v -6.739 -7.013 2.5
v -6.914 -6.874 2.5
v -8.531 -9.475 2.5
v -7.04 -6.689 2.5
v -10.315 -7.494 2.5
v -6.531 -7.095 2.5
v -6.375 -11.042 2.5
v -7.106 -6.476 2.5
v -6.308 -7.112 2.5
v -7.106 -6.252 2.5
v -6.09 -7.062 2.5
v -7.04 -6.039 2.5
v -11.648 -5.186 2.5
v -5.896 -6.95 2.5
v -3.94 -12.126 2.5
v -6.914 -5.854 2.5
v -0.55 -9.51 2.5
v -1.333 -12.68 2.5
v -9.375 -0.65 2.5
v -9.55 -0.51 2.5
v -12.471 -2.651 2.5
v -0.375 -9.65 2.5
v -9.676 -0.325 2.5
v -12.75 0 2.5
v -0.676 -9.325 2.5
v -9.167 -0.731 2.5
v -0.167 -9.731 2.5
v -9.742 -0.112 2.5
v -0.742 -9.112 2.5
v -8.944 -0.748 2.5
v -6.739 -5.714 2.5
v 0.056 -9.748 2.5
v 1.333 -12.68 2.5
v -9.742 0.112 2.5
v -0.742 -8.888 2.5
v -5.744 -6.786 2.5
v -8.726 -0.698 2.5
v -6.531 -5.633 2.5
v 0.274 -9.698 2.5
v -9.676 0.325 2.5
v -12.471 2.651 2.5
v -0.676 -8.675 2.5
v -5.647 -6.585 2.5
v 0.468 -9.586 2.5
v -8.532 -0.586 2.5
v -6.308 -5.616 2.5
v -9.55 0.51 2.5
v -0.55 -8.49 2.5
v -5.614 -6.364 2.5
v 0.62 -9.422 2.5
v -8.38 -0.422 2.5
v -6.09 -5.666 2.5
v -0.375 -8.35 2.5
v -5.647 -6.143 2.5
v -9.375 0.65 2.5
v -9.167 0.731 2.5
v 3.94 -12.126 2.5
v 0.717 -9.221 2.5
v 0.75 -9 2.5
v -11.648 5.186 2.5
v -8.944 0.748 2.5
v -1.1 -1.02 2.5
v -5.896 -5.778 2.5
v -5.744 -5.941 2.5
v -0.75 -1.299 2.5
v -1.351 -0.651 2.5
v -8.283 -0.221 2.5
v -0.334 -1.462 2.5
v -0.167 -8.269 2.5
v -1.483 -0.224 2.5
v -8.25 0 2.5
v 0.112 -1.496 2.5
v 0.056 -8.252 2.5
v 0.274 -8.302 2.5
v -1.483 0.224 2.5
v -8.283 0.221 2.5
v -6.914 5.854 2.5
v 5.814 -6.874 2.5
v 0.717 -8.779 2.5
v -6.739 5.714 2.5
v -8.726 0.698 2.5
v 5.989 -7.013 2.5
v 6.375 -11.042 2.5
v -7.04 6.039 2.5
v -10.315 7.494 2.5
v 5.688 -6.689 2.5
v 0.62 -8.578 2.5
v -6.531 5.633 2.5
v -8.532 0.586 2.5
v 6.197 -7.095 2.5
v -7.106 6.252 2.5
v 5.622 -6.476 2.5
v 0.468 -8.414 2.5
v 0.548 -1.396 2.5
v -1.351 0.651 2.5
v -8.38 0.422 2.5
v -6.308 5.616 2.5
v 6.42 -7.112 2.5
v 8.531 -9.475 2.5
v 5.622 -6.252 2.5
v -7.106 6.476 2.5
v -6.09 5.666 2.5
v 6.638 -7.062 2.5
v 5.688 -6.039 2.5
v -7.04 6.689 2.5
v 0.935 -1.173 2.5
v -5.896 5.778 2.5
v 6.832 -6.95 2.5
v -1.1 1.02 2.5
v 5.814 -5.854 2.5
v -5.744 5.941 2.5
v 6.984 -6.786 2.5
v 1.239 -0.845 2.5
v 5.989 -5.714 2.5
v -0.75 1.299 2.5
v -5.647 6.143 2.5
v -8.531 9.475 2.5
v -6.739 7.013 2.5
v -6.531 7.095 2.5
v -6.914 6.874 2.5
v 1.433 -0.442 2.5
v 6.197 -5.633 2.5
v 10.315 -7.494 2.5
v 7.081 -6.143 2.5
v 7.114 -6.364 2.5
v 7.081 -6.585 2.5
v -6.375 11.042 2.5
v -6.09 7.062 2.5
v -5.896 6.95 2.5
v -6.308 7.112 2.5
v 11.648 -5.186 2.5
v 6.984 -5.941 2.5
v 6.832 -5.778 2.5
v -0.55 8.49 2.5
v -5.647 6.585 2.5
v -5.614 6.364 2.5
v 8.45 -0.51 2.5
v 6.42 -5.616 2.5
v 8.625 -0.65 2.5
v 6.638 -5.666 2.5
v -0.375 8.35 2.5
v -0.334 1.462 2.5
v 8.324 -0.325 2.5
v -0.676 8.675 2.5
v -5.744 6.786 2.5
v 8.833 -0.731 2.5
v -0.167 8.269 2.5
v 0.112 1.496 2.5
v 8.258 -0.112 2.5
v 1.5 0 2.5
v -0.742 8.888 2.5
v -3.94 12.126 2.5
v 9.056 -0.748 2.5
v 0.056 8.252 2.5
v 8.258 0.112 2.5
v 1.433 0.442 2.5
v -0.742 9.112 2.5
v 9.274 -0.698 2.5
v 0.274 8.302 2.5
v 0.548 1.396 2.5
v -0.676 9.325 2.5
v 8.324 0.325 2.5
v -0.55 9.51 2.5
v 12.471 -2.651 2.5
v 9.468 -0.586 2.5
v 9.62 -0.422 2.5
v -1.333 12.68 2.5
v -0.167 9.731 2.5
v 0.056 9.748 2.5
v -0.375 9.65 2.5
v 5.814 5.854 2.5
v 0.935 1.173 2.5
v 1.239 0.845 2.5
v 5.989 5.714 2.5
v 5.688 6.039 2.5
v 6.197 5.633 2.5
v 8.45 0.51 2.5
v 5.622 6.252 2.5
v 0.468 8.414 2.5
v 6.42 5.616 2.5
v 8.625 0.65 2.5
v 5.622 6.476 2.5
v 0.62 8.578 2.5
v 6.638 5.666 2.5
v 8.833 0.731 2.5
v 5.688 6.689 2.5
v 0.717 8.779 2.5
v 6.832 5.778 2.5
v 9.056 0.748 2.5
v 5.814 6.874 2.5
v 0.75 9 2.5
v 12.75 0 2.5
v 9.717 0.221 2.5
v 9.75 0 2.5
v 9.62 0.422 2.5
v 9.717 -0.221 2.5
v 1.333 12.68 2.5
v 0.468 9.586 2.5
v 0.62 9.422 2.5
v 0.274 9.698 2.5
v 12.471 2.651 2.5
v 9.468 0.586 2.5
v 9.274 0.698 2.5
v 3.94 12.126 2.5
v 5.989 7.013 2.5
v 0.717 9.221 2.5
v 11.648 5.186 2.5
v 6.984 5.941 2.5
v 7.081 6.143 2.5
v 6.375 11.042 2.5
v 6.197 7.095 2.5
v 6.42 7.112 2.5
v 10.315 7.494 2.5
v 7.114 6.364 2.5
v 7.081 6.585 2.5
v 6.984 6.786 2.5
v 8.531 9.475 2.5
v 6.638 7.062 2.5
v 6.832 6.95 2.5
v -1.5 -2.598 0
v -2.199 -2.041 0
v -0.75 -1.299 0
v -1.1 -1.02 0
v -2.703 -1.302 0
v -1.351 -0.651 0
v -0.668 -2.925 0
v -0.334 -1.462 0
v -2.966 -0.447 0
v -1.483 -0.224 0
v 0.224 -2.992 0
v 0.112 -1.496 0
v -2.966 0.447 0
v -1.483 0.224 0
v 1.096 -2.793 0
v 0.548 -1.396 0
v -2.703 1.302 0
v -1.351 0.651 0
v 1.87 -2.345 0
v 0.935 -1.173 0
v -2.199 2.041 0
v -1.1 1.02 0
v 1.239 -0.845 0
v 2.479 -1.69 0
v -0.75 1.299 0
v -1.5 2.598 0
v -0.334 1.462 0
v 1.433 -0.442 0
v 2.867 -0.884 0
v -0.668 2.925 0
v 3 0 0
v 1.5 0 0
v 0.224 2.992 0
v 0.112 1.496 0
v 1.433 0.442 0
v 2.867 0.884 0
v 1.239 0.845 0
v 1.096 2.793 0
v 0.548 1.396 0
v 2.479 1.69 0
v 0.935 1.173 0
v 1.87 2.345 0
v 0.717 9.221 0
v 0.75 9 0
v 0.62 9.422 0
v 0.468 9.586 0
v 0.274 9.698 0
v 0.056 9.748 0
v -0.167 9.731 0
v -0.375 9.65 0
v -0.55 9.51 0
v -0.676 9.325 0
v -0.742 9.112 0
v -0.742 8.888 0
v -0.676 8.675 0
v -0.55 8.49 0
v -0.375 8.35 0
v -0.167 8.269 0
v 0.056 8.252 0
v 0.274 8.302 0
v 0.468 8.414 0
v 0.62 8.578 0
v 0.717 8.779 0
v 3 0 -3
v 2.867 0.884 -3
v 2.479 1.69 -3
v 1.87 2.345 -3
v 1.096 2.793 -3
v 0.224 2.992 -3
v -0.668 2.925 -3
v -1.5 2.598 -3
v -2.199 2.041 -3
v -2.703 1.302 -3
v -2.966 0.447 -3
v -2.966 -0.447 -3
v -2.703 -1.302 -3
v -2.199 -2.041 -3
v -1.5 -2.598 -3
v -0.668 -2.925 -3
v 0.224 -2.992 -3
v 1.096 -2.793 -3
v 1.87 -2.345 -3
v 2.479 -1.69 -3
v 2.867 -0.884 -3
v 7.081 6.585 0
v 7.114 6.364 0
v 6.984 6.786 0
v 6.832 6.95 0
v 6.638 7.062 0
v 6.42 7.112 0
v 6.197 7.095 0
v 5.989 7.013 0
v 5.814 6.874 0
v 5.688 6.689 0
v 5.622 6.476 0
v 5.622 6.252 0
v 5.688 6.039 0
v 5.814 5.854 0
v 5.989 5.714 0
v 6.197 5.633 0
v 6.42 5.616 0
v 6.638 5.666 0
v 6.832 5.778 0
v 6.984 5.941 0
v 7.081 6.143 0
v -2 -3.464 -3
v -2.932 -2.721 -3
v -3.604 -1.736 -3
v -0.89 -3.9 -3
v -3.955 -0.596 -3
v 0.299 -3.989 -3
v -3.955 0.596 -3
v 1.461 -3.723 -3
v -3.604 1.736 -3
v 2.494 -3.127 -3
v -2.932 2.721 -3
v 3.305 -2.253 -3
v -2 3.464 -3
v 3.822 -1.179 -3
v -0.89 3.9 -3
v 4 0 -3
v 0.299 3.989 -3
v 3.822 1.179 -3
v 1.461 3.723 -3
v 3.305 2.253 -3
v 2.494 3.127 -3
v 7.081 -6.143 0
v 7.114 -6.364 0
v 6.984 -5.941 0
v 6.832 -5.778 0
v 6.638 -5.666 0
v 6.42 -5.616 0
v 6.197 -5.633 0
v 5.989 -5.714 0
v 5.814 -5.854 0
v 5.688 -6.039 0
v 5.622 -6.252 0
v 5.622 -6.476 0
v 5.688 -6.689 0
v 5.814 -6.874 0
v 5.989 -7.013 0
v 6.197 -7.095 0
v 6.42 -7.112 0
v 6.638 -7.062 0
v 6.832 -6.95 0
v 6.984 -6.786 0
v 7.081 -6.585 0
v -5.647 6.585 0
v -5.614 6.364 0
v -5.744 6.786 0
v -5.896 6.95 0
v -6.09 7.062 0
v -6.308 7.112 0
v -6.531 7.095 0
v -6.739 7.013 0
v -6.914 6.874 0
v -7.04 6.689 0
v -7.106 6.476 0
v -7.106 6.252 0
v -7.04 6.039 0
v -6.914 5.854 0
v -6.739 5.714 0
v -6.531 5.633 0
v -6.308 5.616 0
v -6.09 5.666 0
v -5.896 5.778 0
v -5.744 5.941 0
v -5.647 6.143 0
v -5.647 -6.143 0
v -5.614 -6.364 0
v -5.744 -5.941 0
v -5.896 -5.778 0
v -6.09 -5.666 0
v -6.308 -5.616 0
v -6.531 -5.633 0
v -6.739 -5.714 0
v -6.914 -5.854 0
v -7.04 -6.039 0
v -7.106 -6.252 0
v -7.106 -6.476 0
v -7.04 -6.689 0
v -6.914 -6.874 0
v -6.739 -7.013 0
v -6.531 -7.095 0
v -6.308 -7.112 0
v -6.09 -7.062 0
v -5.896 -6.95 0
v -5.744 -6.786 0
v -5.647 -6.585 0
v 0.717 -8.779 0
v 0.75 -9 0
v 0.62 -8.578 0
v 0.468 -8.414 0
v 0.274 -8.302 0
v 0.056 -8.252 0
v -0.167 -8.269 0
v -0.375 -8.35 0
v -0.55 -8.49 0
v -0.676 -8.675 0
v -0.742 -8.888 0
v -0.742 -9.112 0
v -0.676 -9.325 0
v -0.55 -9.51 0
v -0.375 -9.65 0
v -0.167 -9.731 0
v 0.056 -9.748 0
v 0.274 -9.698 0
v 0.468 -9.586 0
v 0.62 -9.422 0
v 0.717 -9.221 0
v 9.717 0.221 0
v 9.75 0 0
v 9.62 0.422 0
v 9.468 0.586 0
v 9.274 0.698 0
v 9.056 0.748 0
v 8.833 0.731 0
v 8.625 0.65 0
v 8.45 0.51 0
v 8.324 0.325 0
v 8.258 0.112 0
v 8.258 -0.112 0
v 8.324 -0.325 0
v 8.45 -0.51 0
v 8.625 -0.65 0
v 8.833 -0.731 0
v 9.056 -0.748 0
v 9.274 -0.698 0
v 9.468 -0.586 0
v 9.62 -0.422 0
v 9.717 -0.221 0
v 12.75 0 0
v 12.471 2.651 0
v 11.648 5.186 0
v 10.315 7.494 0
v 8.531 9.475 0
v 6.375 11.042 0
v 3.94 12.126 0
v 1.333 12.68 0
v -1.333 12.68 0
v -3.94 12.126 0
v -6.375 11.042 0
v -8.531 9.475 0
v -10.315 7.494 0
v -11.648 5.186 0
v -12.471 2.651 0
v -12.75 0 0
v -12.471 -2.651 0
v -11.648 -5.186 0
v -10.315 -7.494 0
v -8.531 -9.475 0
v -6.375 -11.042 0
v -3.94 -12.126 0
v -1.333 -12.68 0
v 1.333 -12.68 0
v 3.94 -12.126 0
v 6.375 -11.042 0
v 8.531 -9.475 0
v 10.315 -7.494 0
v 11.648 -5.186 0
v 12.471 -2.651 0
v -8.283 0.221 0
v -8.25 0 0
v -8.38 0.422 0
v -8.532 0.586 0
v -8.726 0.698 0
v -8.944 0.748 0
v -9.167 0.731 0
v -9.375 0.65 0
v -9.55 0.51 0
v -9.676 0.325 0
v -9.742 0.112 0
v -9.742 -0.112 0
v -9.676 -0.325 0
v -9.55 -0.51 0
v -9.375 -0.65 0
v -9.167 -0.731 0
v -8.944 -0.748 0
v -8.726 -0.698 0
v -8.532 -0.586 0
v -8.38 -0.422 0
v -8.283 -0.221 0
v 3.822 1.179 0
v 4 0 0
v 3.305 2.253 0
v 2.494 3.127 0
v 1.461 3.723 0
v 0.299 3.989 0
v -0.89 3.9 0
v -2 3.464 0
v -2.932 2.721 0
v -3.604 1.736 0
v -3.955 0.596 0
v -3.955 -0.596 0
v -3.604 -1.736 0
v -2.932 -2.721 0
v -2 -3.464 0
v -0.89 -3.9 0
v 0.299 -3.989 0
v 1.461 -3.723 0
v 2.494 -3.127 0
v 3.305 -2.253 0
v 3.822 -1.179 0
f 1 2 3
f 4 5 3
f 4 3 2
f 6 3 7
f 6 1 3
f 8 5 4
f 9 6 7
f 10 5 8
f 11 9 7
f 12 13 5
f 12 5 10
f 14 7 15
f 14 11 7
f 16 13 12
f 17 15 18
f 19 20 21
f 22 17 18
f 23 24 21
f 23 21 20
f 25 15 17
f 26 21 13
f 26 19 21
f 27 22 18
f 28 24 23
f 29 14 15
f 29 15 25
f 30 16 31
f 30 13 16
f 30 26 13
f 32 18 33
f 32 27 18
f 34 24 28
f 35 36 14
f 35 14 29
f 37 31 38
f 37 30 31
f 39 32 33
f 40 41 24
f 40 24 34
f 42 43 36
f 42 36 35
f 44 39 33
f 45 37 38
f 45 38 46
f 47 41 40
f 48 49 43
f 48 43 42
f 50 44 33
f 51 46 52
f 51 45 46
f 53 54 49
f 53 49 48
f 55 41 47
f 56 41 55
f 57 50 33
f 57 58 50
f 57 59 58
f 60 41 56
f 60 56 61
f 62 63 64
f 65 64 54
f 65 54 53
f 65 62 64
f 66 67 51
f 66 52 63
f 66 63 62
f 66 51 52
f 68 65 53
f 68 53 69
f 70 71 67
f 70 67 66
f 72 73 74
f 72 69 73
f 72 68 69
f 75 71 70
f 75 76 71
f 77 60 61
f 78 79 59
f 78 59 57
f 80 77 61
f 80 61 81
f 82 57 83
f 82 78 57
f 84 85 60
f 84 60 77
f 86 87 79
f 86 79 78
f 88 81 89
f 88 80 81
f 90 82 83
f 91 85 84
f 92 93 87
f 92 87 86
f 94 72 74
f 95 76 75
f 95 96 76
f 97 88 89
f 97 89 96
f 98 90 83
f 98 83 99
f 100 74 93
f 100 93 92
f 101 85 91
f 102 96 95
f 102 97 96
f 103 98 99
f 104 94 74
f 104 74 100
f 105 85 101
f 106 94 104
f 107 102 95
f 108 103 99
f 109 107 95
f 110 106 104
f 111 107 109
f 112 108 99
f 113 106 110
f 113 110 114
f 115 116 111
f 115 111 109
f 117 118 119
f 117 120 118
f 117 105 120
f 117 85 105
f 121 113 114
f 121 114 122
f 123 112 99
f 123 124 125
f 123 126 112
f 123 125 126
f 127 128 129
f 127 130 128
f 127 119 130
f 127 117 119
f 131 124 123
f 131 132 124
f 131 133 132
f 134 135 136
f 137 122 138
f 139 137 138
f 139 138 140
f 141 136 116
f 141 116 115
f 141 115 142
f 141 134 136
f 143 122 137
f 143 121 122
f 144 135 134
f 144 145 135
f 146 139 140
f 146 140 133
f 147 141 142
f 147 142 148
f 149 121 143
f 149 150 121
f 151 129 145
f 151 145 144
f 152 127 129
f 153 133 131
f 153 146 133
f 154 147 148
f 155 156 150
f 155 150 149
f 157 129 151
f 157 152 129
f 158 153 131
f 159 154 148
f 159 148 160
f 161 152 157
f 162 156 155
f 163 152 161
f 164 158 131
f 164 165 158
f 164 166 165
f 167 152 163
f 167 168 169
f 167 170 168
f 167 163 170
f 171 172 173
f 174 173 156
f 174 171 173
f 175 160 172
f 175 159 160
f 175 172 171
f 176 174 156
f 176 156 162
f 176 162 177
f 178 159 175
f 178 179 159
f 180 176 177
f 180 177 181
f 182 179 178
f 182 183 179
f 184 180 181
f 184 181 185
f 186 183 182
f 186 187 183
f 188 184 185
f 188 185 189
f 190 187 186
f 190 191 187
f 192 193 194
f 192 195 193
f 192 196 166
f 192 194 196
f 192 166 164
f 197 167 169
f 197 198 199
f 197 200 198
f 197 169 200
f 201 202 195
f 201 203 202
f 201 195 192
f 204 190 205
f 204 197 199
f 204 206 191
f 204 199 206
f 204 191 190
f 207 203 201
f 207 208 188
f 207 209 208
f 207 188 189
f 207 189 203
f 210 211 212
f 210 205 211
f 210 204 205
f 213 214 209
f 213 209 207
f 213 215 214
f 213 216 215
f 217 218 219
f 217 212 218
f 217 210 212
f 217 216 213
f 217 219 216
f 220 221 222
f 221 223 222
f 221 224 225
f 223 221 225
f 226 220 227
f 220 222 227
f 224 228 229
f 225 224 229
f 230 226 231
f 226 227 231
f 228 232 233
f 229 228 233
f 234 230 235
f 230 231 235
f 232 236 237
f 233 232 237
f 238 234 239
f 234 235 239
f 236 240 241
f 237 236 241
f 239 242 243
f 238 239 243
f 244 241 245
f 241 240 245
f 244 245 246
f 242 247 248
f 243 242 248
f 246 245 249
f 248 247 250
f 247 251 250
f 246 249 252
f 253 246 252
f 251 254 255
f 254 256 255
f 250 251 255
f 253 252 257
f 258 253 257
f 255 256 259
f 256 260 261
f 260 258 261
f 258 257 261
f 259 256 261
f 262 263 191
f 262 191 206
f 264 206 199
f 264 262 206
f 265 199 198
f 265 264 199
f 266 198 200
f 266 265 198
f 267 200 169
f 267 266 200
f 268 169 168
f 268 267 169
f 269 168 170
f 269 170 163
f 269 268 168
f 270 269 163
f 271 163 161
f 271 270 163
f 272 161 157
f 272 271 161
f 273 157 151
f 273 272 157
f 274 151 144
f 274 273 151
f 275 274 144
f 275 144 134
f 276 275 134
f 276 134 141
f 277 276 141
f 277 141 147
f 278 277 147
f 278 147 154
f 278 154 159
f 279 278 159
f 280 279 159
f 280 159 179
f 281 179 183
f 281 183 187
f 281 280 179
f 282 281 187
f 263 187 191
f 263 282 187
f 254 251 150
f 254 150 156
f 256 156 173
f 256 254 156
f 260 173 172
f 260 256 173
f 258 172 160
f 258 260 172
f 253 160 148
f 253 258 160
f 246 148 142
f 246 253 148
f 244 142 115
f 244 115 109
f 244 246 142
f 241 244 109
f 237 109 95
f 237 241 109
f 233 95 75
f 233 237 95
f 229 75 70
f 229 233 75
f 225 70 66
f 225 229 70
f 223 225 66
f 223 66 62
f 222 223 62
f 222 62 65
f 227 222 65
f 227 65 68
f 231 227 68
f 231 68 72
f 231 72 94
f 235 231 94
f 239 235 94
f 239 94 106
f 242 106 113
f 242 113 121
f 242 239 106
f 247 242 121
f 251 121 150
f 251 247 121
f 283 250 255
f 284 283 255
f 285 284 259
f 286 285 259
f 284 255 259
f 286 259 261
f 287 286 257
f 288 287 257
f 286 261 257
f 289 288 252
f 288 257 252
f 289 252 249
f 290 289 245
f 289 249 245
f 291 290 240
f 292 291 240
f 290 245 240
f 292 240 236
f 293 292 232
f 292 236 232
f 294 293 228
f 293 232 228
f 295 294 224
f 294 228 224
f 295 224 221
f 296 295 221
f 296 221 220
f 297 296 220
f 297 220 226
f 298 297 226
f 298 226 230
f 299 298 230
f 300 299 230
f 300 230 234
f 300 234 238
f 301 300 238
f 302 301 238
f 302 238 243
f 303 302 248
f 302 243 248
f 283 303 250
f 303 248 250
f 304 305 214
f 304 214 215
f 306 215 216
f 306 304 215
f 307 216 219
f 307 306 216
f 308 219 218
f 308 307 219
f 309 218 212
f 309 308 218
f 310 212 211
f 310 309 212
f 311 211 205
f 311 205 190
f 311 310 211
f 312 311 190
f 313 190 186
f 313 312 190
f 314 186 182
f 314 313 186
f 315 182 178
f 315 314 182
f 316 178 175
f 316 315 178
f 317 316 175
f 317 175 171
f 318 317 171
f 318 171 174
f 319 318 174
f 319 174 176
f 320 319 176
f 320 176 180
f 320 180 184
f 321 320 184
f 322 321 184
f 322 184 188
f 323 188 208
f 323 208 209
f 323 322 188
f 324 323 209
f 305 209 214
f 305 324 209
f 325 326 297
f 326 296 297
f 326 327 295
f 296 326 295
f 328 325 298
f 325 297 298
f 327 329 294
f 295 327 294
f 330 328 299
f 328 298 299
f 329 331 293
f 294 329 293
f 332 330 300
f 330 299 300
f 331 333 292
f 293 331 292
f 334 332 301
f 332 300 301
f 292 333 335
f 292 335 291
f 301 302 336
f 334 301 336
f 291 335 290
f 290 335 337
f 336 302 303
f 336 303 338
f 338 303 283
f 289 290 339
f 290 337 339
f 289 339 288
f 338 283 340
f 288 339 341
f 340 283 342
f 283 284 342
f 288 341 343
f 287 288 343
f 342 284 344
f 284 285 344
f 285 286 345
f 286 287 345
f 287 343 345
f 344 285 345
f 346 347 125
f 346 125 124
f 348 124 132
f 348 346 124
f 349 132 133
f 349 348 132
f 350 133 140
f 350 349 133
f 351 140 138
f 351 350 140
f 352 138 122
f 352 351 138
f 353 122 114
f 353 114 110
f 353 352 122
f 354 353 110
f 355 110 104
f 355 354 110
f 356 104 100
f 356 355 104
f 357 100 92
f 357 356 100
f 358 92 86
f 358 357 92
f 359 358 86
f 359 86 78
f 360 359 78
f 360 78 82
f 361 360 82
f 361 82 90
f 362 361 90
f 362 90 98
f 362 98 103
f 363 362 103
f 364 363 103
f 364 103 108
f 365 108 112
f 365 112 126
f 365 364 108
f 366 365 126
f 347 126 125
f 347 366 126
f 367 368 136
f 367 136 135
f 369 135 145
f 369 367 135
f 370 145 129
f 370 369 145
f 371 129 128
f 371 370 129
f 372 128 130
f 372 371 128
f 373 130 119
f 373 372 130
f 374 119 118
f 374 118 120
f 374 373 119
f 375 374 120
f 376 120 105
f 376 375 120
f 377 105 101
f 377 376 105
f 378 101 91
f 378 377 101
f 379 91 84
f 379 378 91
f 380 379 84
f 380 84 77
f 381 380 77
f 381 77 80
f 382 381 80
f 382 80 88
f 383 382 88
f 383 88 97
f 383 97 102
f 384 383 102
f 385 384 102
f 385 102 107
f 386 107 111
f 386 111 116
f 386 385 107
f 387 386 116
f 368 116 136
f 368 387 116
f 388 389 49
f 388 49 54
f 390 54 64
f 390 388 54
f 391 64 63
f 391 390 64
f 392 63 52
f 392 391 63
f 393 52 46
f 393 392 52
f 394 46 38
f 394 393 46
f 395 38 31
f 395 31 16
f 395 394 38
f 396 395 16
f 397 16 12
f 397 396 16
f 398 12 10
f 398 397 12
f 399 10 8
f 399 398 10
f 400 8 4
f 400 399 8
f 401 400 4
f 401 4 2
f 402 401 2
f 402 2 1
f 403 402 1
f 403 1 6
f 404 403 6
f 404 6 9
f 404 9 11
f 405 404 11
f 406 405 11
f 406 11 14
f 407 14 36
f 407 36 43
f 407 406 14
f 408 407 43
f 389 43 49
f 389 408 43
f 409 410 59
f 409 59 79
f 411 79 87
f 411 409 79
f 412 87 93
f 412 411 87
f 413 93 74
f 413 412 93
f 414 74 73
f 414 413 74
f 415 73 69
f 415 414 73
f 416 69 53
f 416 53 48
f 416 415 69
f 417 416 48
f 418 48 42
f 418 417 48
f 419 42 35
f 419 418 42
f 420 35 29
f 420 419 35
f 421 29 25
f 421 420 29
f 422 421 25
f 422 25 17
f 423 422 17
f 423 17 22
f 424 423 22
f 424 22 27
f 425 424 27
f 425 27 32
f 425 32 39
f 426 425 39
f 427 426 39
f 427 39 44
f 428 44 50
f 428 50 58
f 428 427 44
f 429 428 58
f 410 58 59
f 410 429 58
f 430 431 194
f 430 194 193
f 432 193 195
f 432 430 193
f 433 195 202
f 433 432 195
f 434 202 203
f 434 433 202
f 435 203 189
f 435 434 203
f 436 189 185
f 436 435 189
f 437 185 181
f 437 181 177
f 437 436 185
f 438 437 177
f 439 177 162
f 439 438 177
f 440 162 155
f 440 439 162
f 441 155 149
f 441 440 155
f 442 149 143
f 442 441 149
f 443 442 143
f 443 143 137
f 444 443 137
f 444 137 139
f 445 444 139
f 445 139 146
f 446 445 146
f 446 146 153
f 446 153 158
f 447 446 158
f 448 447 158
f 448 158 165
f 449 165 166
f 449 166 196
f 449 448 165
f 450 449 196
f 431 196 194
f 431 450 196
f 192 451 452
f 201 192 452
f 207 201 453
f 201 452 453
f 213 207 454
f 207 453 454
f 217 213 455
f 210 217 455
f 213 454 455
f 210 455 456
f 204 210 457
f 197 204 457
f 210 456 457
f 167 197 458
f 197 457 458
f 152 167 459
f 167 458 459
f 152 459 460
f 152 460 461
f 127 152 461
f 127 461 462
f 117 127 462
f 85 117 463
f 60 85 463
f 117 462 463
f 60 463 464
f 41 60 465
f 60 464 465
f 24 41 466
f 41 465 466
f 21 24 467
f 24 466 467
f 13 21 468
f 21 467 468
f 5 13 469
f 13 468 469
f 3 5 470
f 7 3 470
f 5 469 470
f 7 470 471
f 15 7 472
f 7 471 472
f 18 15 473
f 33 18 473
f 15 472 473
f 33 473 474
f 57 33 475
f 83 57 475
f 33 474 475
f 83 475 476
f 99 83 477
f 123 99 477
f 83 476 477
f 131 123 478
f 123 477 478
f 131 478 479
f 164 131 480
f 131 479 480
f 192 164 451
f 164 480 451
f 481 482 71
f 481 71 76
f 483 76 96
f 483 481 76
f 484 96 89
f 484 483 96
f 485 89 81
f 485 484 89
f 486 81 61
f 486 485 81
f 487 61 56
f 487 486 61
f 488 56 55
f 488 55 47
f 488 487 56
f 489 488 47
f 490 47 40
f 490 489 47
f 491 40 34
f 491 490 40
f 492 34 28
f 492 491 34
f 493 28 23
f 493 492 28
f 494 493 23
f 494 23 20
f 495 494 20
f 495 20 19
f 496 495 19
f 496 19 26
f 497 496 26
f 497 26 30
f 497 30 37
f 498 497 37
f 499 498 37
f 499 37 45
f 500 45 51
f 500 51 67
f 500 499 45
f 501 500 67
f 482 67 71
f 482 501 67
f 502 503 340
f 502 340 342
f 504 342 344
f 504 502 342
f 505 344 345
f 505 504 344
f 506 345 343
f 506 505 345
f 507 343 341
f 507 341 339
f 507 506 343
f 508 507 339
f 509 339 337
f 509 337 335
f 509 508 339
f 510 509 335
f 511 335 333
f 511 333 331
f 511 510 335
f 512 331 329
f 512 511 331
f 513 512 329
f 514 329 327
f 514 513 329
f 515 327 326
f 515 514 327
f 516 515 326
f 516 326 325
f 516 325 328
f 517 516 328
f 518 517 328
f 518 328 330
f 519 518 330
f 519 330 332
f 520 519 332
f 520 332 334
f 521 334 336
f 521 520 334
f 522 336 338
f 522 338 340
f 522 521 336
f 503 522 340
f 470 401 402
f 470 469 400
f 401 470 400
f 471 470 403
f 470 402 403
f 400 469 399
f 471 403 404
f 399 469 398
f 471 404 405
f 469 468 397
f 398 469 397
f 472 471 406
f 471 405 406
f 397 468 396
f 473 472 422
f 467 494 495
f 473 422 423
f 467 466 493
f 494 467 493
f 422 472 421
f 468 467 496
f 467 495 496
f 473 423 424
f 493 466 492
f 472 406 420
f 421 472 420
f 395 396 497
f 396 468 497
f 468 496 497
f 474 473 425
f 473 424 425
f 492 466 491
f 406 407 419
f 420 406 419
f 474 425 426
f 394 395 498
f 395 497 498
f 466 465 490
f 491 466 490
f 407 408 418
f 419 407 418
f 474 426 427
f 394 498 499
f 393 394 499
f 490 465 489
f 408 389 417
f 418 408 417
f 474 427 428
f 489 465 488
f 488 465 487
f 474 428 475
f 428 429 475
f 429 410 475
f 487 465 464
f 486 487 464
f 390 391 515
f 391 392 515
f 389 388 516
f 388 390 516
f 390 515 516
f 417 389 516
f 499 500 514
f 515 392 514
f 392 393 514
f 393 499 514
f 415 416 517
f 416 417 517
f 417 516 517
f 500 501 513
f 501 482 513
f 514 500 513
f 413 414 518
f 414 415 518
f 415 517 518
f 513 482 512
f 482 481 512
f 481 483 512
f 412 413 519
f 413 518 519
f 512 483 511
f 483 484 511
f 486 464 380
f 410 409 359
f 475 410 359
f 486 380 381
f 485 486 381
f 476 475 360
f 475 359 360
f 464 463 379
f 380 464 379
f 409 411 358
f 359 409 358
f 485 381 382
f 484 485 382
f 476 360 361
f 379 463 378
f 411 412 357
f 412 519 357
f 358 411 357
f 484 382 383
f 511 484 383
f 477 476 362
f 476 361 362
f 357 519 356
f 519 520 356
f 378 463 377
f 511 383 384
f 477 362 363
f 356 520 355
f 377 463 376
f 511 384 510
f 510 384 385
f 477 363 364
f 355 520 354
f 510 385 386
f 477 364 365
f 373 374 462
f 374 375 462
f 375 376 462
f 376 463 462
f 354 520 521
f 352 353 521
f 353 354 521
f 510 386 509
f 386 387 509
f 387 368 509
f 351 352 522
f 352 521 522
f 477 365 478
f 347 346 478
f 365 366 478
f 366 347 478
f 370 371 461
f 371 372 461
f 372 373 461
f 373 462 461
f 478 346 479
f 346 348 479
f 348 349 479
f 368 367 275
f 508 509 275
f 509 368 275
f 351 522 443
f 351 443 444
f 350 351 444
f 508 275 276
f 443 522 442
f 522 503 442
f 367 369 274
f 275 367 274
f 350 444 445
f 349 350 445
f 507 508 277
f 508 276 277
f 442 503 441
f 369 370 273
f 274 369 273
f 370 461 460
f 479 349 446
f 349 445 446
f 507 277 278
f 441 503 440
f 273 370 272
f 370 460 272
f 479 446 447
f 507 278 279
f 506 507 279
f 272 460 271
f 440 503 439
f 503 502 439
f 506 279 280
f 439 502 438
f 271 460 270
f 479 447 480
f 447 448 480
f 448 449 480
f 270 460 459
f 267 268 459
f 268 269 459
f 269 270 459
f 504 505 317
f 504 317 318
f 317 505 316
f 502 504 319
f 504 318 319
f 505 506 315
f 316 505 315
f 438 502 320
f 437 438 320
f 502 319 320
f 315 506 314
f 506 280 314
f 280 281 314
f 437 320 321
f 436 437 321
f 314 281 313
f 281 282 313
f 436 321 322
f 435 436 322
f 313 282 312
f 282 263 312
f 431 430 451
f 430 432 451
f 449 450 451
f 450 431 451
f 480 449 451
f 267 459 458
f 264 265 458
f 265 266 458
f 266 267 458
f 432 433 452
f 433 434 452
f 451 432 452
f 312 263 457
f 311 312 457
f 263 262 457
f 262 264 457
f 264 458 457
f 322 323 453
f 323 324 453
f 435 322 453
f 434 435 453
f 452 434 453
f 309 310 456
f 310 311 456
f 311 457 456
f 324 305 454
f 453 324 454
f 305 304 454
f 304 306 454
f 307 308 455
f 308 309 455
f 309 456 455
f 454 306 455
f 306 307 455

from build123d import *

# Parameters (mm, degrees)
F0_R     = 12.75
F0_R_2   = 0.75
F0_R_3   = 4
F0_R_4   = 3
F0_R_5   = 1.5
F1_DEPTH = 2.5
F2_DEPTH = 3


with BuildPart() as f1:
    # F0 (on Top) → F1 (new body)
    with BuildSketch(Plane.XY):
        Circle(F0_R)
        with Locations((-6.3639610307, -6.3639610307)):
            Circle(F0_R_2, mode=Mode.SUBTRACT)
        with Locations((0, -9)):
            Circle(F0_R_2, mode=Mode.SUBTRACT)
        with Locations((6.3639610307, -6.3639610307)):
            Circle(F0_R_2, mode=Mode.SUBTRACT)
        with Locations((-9, 0)):
            Circle(F0_R_2, mode=Mode.SUBTRACT)
        with Locations((-6.3639610307, 6.3639610307)):
            Circle(F0_R_2, mode=Mode.SUBTRACT)
        Circle(F0_R_3, mode=Mode.SUBTRACT)
        with Locations((6.3639610307, 6.3639610307)):
            Circle(F0_R_2, mode=Mode.SUBTRACT)
        with Locations((9, 0)):
            Circle(F0_R_2, mode=Mode.SUBTRACT)
        with Locations((0, 9)):
            Circle(F0_R_2, mode=Mode.SUBTRACT)
        Circle(F0_R_3)
        Circle(F0_R_4, mode=Mode.SUBTRACT)
        Circle(F0_R_4)
        Circle(F0_R_5, mode=Mode.SUBTRACT)
    extrude(amount=F1_DEPTH)

    # F0 (on Top) → F2 (join)
    with BuildSketch(Plane.XY):
        Circle(F0_R_3)
        Circle(F0_R_4, mode=Mode.SUBTRACT)
    extrude(amount=-F2_DEPTH)


solid = f1.part
